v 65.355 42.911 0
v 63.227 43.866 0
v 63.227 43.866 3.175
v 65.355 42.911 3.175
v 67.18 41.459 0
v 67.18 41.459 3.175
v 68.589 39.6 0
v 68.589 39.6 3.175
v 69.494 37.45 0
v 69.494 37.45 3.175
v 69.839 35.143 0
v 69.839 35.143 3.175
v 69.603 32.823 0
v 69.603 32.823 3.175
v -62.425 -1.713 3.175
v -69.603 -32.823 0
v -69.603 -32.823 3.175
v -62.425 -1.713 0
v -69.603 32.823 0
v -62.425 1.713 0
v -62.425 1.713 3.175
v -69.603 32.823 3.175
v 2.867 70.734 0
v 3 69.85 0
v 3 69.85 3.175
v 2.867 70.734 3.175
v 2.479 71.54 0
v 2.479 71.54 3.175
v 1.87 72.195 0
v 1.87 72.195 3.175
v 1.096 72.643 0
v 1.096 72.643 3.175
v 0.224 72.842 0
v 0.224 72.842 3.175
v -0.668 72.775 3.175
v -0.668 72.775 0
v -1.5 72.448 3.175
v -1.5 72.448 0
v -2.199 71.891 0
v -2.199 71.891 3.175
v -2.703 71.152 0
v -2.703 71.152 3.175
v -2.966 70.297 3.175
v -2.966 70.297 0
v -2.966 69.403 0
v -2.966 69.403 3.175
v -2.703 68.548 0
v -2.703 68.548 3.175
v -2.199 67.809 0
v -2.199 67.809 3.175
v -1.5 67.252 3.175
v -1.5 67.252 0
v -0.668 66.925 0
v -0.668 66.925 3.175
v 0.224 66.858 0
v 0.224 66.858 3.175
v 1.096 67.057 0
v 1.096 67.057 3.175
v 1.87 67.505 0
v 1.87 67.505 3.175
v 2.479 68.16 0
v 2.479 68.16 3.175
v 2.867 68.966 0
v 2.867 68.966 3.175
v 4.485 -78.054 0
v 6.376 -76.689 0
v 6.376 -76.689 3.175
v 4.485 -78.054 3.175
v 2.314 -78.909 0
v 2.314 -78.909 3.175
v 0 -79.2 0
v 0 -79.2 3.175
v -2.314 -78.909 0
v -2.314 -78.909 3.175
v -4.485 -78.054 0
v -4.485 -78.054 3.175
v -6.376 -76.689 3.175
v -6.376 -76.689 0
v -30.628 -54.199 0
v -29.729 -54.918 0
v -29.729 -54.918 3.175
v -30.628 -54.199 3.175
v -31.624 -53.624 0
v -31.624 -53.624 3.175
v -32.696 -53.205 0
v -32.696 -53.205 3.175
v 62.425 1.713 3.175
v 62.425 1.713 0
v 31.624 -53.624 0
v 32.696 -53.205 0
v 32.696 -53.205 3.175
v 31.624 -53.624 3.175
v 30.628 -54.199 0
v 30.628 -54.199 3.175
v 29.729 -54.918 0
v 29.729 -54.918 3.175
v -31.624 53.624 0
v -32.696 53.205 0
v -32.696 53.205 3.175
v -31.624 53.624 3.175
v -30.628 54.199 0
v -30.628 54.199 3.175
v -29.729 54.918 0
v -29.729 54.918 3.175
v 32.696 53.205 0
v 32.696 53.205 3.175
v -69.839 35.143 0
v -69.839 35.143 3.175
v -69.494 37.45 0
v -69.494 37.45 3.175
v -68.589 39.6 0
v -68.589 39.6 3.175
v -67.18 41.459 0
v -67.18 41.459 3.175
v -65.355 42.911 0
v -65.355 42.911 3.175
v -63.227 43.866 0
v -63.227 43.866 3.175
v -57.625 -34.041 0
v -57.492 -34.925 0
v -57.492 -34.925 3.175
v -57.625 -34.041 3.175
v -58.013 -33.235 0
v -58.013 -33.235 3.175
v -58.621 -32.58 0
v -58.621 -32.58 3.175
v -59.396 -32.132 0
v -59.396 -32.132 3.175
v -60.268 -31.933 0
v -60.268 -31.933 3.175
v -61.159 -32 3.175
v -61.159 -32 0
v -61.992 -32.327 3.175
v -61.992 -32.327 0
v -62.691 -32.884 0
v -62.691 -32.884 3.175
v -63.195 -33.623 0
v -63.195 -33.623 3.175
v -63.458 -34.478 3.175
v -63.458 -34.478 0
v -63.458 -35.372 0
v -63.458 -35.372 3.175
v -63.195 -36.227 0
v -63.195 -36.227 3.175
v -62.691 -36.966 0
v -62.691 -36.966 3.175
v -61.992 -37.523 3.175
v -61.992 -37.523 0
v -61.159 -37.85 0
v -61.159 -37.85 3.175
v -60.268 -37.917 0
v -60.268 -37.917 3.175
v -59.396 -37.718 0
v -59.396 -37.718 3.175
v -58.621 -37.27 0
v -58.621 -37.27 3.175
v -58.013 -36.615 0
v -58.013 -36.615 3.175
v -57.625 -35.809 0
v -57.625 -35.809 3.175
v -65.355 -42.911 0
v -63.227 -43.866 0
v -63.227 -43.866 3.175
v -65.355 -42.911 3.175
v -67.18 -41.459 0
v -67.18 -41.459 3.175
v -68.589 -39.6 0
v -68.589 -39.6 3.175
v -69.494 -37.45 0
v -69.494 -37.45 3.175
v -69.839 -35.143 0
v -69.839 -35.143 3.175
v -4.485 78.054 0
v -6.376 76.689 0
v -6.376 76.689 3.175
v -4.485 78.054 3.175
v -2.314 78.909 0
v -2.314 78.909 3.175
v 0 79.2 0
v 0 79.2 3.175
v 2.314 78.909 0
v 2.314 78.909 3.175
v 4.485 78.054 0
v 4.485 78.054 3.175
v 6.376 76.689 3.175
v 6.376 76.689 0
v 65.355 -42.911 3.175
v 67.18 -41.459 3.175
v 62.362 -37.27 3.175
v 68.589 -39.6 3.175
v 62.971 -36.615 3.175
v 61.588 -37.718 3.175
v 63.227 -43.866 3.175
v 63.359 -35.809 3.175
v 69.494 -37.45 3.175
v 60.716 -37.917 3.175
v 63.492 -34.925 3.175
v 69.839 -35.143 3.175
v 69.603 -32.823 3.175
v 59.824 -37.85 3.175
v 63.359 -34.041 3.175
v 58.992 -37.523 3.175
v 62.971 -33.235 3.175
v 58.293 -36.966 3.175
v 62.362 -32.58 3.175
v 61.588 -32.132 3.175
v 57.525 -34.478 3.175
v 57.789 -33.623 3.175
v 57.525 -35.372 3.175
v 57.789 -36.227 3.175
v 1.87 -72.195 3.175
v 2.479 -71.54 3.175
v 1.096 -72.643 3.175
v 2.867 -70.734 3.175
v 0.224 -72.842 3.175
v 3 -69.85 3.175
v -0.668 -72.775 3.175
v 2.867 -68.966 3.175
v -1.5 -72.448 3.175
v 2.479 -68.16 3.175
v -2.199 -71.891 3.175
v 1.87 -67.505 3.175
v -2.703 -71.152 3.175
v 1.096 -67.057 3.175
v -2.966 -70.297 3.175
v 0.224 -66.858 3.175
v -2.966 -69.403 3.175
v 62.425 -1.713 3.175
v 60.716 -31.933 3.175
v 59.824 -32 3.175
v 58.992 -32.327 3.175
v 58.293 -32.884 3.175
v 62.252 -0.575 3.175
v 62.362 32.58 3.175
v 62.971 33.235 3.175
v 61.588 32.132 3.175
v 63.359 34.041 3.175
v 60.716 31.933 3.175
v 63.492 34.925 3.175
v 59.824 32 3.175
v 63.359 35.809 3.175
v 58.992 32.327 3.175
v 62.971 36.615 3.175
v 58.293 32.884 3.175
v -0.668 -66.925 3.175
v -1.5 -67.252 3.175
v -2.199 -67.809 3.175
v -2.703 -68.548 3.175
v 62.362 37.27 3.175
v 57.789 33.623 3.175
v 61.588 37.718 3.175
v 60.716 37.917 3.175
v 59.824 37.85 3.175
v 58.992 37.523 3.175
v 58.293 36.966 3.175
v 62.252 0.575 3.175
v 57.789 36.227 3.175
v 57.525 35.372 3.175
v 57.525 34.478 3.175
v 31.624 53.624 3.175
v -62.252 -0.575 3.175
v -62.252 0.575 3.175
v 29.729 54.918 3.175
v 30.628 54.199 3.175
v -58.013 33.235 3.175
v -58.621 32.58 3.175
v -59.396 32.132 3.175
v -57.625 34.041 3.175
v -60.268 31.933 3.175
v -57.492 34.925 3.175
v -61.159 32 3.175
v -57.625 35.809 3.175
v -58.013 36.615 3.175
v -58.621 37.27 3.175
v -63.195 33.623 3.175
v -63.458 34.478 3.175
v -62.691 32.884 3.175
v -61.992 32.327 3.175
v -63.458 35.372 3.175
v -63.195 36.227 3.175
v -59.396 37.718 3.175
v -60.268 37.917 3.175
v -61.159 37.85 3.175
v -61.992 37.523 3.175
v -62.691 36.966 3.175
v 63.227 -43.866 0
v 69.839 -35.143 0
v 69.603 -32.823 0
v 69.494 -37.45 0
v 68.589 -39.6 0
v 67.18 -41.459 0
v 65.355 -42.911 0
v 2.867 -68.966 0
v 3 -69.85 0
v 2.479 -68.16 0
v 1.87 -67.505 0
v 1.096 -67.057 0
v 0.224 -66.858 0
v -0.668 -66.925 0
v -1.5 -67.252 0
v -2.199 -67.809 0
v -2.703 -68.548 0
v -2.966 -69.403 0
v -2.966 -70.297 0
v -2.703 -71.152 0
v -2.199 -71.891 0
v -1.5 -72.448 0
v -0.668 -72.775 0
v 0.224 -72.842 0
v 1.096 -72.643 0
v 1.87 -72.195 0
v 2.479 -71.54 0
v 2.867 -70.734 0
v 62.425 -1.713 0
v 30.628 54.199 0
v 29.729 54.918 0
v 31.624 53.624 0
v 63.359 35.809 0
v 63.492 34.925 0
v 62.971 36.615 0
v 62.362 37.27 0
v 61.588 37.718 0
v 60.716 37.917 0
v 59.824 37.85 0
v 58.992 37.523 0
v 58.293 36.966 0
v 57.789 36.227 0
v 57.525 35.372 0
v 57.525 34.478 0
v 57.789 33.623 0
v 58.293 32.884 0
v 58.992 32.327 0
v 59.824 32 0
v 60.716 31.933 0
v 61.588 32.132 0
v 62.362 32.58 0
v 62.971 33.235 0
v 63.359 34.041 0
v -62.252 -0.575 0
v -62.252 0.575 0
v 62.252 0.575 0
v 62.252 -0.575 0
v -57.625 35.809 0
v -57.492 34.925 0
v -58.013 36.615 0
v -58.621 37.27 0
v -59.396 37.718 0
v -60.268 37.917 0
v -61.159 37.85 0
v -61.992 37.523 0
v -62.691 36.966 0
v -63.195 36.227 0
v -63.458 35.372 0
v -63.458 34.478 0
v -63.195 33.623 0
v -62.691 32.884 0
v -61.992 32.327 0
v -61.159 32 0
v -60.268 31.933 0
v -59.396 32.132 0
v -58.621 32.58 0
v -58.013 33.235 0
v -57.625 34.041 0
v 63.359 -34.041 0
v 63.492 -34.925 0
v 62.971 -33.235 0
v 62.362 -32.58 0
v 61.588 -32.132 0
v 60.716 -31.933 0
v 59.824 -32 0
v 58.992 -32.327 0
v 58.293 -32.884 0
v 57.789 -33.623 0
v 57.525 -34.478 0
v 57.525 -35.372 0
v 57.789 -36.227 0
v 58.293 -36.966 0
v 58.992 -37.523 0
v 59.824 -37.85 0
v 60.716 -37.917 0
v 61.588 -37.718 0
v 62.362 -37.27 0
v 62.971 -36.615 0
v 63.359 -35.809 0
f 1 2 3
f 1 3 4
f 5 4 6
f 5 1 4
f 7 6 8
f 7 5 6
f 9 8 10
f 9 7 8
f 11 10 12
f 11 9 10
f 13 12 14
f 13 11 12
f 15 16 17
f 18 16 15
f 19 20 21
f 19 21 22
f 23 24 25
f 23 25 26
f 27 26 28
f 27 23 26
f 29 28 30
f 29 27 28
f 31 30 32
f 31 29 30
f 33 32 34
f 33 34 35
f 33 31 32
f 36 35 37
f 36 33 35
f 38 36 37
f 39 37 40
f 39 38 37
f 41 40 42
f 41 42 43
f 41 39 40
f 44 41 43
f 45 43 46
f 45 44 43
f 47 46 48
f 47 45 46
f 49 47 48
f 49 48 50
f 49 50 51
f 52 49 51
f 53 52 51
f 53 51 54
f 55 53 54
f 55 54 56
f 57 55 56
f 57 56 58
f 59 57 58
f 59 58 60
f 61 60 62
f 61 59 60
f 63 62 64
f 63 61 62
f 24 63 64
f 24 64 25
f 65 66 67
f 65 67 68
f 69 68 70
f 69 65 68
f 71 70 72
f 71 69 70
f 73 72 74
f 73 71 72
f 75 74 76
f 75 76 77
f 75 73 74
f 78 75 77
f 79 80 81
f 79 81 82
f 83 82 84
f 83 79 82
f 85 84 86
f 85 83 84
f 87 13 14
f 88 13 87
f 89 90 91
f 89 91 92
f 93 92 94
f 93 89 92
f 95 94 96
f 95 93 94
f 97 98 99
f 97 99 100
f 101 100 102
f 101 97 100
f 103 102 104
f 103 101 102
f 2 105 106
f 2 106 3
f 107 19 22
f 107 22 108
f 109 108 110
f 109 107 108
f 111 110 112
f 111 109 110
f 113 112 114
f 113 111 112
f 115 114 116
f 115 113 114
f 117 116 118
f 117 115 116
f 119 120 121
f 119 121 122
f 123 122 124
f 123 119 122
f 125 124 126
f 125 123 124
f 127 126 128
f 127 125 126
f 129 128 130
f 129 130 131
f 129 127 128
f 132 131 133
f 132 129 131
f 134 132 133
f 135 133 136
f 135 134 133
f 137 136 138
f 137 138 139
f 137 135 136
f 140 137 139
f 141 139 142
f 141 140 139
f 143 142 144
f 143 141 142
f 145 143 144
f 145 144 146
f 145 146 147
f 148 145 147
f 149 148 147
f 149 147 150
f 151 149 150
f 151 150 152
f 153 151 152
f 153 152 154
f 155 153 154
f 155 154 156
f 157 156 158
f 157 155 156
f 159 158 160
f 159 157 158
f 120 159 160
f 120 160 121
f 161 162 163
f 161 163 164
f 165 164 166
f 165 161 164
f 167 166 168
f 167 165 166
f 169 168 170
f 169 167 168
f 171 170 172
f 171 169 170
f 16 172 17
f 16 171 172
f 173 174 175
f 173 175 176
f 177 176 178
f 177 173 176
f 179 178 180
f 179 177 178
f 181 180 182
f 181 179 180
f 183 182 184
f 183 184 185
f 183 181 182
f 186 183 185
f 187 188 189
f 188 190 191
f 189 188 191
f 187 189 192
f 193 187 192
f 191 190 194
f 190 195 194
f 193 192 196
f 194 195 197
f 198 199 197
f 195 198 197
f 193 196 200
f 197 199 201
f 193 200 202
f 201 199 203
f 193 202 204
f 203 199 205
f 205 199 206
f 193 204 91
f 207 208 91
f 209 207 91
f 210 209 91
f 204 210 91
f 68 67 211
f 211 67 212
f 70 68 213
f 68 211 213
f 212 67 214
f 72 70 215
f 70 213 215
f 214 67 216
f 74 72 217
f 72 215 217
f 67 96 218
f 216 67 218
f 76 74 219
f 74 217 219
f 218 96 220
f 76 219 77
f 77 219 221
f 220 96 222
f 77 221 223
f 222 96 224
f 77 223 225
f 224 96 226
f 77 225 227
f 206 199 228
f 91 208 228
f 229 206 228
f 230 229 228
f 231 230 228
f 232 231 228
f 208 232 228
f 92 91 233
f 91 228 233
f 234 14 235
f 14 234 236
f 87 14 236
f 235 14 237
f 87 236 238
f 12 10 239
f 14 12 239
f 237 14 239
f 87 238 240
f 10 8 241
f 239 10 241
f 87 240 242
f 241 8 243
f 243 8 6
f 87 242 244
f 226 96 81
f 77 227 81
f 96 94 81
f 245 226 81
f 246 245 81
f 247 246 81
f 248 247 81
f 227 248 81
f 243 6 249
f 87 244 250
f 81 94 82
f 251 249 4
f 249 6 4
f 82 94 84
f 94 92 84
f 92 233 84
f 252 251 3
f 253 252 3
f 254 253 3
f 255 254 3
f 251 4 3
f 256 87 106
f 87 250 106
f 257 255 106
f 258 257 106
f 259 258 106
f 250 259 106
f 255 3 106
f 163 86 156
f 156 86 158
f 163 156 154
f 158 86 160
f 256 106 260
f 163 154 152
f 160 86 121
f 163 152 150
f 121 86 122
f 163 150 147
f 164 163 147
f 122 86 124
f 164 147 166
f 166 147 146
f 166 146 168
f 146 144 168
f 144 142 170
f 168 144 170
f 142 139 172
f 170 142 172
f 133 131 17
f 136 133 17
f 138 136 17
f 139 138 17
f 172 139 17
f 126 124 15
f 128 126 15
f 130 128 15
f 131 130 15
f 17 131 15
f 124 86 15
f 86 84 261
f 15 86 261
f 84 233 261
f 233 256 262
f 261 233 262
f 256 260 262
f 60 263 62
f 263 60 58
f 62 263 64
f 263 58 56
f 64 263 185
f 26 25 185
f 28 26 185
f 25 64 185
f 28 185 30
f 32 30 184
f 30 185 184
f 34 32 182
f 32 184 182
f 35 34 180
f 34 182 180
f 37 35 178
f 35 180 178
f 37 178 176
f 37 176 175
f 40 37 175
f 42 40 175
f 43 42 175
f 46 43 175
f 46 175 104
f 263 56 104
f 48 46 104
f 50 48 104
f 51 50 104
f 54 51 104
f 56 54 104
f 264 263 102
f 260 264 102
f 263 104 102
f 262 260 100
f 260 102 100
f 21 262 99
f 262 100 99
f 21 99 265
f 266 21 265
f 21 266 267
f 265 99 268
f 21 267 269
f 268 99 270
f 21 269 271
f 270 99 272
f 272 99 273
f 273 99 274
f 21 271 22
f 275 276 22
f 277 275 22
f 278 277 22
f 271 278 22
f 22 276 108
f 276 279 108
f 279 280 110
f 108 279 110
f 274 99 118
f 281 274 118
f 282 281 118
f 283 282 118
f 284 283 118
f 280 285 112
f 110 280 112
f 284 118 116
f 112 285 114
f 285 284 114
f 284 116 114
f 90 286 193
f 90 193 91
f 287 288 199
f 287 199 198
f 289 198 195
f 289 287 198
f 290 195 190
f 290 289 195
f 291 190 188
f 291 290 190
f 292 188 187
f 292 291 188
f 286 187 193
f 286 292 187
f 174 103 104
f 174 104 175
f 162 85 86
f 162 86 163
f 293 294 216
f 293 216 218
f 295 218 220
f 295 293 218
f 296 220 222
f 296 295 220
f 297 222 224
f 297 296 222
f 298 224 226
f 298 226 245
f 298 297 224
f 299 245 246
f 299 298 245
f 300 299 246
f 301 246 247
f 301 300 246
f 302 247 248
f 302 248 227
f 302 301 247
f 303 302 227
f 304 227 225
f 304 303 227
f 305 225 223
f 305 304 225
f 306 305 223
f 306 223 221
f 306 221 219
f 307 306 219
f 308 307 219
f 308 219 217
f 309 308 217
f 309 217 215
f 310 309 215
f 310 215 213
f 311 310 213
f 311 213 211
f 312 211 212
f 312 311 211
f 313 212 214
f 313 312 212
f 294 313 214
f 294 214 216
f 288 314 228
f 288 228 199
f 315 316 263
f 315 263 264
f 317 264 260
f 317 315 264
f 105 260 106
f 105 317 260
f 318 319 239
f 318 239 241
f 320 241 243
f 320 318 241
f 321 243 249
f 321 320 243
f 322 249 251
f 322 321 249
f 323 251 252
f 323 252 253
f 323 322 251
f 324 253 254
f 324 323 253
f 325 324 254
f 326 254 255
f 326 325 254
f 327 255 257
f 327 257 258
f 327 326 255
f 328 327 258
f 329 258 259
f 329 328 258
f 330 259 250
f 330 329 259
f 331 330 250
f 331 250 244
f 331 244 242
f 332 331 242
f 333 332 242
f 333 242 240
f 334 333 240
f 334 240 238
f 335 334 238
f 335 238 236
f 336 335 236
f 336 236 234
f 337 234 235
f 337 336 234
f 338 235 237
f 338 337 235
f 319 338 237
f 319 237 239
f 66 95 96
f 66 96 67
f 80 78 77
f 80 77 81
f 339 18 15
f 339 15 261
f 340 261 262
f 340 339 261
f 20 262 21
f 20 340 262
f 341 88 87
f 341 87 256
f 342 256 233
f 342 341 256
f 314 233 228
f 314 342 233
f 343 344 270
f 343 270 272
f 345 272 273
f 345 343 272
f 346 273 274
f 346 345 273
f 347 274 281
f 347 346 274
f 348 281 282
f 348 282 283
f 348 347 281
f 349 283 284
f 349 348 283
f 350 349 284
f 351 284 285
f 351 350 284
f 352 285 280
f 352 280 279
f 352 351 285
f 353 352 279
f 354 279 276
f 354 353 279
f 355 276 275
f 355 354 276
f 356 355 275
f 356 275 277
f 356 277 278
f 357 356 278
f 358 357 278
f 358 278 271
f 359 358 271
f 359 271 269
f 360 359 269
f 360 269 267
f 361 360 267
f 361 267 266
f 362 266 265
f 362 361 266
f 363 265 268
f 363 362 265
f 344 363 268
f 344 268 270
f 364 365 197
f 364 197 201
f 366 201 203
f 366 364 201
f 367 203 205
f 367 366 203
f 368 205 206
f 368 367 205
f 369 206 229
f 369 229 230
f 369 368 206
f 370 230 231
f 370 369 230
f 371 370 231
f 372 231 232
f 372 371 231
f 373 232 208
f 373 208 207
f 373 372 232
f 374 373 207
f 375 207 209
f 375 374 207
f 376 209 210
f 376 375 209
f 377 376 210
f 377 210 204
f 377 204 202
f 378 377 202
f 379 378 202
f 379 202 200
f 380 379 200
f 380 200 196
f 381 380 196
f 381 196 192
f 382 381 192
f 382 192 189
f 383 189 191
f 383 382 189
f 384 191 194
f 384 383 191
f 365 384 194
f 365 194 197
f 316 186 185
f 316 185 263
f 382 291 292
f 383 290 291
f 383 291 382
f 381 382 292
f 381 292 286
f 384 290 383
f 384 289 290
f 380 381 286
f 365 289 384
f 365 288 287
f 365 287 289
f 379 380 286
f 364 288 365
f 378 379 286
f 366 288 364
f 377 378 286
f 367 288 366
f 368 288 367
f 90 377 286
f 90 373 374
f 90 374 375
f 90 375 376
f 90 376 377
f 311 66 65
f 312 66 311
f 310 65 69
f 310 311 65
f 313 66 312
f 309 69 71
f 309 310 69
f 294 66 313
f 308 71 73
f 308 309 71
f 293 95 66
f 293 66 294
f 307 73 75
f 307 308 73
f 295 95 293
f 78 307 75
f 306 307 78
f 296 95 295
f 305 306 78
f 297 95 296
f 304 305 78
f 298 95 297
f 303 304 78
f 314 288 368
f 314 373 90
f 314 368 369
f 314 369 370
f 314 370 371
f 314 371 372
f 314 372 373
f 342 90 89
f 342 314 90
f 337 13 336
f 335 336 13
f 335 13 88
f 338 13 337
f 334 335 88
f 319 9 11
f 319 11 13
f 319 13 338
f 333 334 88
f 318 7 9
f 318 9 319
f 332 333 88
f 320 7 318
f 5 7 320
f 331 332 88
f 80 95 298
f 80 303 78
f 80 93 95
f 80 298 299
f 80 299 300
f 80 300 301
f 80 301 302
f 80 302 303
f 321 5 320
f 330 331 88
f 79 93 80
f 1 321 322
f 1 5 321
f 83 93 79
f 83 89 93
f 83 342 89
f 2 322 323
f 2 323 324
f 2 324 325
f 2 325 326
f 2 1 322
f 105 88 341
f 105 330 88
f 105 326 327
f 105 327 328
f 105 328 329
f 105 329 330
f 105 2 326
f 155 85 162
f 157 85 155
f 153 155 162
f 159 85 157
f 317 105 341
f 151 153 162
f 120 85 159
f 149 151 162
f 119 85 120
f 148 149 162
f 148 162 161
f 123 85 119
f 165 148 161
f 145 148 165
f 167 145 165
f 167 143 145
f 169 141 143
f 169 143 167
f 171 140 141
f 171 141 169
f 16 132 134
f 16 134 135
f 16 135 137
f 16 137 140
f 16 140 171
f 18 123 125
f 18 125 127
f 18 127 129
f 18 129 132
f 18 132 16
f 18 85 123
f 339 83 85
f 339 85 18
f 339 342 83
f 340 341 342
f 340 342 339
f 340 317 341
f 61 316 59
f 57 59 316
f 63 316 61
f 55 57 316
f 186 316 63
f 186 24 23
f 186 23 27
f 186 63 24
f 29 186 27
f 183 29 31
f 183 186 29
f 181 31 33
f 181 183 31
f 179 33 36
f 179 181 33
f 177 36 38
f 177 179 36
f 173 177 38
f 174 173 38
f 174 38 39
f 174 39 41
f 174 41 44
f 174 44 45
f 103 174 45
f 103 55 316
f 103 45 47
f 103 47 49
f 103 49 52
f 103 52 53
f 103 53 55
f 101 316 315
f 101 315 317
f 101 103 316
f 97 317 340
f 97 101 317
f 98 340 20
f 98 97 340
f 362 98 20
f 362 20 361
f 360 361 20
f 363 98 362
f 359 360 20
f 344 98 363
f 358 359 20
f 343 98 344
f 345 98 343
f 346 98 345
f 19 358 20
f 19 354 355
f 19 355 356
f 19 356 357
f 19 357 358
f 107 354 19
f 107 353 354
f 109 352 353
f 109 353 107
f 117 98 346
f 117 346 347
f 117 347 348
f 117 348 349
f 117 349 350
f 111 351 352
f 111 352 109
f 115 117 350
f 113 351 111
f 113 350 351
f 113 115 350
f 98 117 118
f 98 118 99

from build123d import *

# Parameters (mm, degrees)
SKETCH1_R           = 3
BOSS_EXTRUDE2_DEPTH = 3.175


with BuildPart() as part:
    # Sketch1 → Boss-Extrude2 (new body)
    with BuildSketch(Plane.XY):
        with BuildLine():
            Line((6.375679422, 76.689094378), (29.728991744, 54.9181954))
            ThreePointArc((29.728991744, 54.9181954), (31.115, 53.892760878), (32.696056474, 53.205159779))
            Line((32.696056474, 53.205159779), (63.226864214, 43.866047535))
            ThreePointArc((63.226864214, 43.866047535), (68.58921198, 39.6), (69.602543635, 32.823046843))
            Line((69.602543635, 32.823046843), (62.425048218, 1.713035621))
            ThreePointArc((62.425048218, 1.713035621), (62.23, 0), (62.425048218, -1.713035621))
            Line((62.425048218, -1.713035621), (69.602543635, -32.823046843))
            ThreePointArc((69.602543635, -32.823046843), (68.58921198, -39.6), (63.226864214, -43.866047535))
            Line((63.226864214, -43.866047535), (32.696056474, -53.205159779))
            ThreePointArc((32.696056474, -53.205159779), (31.115, -53.892760878), (29.728991744, -54.9181954))
            Line((29.728991744, -54.9181954), (6.375679422, -76.689094378))
            ThreePointArc((6.375679422, -76.689094378), (0, -79.2), (-6.375679422, -76.689094378))
            Line((-6.375679422, -76.689094378), (-29.728991744, -54.9181954))
            ThreePointArc((-29.728991744, -54.9181954), (-31.115, -53.892760878), (-32.696056474, -53.205159779))
            Line((-32.696056474, -53.205159779), (-63.226864214, -43.866047535))
            ThreePointArc((-63.226864214, -43.866047535), (-68.58921198, -39.6), (-69.602543635, -32.823046843))
            Line((-69.602543635, -32.823046843), (-62.425048218, -1.713035621))
            ThreePointArc((-62.425048218, -1.713035621), (-62.23, 0), (-62.425048218, 1.713035621))
            Line((-62.425048218, 1.713035621), (-69.602543635, 32.823046843))
            ThreePointArc((-69.602543635, 32.823046843), (-68.58921198, 39.6), (-63.226864214, 43.866047535))
            Line((-63.226864214, 43.866047535), (-32.696056474, 53.205159779))
            ThreePointArc((-32.696056474, 53.205159779), (-31.115, 53.892760878), (-29.728991744, 54.9181954))
            Line((-29.728991744, 54.9181954), (-6.375679422, 76.689094378))
            ThreePointArc((-6.375679422, 76.689094378), (0, 79.2), (6.375679422, 76.689094378))
        make_face()
        with Locations((0, 69.85)):
            Circle(SKETCH1_R, mode=Mode.SUBTRACT)
        with Locations((60.491874454, 34.925)):
            Circle(SKETCH1_R, mode=Mode.SUBTRACT)
        with Locations((60.491874454, -34.925)):
            Circle(SKETCH1_R, mode=Mode.SUBTRACT)
        with Locations((0, -69.85)):
            Circle(SKETCH1_R, mode=Mode.SUBTRACT)
        with Locations((-60.491874454, -34.925)):
            Circle(SKETCH1_R, mode=Mode.SUBTRACT)
        with Locations((-60.491874454, 34.925)):
            Circle(SKETCH1_R, mode=Mode.SUBTRACT)
    extrude(amount=BOSS_EXTRUDE2_DEPTH)


solid = part.part
